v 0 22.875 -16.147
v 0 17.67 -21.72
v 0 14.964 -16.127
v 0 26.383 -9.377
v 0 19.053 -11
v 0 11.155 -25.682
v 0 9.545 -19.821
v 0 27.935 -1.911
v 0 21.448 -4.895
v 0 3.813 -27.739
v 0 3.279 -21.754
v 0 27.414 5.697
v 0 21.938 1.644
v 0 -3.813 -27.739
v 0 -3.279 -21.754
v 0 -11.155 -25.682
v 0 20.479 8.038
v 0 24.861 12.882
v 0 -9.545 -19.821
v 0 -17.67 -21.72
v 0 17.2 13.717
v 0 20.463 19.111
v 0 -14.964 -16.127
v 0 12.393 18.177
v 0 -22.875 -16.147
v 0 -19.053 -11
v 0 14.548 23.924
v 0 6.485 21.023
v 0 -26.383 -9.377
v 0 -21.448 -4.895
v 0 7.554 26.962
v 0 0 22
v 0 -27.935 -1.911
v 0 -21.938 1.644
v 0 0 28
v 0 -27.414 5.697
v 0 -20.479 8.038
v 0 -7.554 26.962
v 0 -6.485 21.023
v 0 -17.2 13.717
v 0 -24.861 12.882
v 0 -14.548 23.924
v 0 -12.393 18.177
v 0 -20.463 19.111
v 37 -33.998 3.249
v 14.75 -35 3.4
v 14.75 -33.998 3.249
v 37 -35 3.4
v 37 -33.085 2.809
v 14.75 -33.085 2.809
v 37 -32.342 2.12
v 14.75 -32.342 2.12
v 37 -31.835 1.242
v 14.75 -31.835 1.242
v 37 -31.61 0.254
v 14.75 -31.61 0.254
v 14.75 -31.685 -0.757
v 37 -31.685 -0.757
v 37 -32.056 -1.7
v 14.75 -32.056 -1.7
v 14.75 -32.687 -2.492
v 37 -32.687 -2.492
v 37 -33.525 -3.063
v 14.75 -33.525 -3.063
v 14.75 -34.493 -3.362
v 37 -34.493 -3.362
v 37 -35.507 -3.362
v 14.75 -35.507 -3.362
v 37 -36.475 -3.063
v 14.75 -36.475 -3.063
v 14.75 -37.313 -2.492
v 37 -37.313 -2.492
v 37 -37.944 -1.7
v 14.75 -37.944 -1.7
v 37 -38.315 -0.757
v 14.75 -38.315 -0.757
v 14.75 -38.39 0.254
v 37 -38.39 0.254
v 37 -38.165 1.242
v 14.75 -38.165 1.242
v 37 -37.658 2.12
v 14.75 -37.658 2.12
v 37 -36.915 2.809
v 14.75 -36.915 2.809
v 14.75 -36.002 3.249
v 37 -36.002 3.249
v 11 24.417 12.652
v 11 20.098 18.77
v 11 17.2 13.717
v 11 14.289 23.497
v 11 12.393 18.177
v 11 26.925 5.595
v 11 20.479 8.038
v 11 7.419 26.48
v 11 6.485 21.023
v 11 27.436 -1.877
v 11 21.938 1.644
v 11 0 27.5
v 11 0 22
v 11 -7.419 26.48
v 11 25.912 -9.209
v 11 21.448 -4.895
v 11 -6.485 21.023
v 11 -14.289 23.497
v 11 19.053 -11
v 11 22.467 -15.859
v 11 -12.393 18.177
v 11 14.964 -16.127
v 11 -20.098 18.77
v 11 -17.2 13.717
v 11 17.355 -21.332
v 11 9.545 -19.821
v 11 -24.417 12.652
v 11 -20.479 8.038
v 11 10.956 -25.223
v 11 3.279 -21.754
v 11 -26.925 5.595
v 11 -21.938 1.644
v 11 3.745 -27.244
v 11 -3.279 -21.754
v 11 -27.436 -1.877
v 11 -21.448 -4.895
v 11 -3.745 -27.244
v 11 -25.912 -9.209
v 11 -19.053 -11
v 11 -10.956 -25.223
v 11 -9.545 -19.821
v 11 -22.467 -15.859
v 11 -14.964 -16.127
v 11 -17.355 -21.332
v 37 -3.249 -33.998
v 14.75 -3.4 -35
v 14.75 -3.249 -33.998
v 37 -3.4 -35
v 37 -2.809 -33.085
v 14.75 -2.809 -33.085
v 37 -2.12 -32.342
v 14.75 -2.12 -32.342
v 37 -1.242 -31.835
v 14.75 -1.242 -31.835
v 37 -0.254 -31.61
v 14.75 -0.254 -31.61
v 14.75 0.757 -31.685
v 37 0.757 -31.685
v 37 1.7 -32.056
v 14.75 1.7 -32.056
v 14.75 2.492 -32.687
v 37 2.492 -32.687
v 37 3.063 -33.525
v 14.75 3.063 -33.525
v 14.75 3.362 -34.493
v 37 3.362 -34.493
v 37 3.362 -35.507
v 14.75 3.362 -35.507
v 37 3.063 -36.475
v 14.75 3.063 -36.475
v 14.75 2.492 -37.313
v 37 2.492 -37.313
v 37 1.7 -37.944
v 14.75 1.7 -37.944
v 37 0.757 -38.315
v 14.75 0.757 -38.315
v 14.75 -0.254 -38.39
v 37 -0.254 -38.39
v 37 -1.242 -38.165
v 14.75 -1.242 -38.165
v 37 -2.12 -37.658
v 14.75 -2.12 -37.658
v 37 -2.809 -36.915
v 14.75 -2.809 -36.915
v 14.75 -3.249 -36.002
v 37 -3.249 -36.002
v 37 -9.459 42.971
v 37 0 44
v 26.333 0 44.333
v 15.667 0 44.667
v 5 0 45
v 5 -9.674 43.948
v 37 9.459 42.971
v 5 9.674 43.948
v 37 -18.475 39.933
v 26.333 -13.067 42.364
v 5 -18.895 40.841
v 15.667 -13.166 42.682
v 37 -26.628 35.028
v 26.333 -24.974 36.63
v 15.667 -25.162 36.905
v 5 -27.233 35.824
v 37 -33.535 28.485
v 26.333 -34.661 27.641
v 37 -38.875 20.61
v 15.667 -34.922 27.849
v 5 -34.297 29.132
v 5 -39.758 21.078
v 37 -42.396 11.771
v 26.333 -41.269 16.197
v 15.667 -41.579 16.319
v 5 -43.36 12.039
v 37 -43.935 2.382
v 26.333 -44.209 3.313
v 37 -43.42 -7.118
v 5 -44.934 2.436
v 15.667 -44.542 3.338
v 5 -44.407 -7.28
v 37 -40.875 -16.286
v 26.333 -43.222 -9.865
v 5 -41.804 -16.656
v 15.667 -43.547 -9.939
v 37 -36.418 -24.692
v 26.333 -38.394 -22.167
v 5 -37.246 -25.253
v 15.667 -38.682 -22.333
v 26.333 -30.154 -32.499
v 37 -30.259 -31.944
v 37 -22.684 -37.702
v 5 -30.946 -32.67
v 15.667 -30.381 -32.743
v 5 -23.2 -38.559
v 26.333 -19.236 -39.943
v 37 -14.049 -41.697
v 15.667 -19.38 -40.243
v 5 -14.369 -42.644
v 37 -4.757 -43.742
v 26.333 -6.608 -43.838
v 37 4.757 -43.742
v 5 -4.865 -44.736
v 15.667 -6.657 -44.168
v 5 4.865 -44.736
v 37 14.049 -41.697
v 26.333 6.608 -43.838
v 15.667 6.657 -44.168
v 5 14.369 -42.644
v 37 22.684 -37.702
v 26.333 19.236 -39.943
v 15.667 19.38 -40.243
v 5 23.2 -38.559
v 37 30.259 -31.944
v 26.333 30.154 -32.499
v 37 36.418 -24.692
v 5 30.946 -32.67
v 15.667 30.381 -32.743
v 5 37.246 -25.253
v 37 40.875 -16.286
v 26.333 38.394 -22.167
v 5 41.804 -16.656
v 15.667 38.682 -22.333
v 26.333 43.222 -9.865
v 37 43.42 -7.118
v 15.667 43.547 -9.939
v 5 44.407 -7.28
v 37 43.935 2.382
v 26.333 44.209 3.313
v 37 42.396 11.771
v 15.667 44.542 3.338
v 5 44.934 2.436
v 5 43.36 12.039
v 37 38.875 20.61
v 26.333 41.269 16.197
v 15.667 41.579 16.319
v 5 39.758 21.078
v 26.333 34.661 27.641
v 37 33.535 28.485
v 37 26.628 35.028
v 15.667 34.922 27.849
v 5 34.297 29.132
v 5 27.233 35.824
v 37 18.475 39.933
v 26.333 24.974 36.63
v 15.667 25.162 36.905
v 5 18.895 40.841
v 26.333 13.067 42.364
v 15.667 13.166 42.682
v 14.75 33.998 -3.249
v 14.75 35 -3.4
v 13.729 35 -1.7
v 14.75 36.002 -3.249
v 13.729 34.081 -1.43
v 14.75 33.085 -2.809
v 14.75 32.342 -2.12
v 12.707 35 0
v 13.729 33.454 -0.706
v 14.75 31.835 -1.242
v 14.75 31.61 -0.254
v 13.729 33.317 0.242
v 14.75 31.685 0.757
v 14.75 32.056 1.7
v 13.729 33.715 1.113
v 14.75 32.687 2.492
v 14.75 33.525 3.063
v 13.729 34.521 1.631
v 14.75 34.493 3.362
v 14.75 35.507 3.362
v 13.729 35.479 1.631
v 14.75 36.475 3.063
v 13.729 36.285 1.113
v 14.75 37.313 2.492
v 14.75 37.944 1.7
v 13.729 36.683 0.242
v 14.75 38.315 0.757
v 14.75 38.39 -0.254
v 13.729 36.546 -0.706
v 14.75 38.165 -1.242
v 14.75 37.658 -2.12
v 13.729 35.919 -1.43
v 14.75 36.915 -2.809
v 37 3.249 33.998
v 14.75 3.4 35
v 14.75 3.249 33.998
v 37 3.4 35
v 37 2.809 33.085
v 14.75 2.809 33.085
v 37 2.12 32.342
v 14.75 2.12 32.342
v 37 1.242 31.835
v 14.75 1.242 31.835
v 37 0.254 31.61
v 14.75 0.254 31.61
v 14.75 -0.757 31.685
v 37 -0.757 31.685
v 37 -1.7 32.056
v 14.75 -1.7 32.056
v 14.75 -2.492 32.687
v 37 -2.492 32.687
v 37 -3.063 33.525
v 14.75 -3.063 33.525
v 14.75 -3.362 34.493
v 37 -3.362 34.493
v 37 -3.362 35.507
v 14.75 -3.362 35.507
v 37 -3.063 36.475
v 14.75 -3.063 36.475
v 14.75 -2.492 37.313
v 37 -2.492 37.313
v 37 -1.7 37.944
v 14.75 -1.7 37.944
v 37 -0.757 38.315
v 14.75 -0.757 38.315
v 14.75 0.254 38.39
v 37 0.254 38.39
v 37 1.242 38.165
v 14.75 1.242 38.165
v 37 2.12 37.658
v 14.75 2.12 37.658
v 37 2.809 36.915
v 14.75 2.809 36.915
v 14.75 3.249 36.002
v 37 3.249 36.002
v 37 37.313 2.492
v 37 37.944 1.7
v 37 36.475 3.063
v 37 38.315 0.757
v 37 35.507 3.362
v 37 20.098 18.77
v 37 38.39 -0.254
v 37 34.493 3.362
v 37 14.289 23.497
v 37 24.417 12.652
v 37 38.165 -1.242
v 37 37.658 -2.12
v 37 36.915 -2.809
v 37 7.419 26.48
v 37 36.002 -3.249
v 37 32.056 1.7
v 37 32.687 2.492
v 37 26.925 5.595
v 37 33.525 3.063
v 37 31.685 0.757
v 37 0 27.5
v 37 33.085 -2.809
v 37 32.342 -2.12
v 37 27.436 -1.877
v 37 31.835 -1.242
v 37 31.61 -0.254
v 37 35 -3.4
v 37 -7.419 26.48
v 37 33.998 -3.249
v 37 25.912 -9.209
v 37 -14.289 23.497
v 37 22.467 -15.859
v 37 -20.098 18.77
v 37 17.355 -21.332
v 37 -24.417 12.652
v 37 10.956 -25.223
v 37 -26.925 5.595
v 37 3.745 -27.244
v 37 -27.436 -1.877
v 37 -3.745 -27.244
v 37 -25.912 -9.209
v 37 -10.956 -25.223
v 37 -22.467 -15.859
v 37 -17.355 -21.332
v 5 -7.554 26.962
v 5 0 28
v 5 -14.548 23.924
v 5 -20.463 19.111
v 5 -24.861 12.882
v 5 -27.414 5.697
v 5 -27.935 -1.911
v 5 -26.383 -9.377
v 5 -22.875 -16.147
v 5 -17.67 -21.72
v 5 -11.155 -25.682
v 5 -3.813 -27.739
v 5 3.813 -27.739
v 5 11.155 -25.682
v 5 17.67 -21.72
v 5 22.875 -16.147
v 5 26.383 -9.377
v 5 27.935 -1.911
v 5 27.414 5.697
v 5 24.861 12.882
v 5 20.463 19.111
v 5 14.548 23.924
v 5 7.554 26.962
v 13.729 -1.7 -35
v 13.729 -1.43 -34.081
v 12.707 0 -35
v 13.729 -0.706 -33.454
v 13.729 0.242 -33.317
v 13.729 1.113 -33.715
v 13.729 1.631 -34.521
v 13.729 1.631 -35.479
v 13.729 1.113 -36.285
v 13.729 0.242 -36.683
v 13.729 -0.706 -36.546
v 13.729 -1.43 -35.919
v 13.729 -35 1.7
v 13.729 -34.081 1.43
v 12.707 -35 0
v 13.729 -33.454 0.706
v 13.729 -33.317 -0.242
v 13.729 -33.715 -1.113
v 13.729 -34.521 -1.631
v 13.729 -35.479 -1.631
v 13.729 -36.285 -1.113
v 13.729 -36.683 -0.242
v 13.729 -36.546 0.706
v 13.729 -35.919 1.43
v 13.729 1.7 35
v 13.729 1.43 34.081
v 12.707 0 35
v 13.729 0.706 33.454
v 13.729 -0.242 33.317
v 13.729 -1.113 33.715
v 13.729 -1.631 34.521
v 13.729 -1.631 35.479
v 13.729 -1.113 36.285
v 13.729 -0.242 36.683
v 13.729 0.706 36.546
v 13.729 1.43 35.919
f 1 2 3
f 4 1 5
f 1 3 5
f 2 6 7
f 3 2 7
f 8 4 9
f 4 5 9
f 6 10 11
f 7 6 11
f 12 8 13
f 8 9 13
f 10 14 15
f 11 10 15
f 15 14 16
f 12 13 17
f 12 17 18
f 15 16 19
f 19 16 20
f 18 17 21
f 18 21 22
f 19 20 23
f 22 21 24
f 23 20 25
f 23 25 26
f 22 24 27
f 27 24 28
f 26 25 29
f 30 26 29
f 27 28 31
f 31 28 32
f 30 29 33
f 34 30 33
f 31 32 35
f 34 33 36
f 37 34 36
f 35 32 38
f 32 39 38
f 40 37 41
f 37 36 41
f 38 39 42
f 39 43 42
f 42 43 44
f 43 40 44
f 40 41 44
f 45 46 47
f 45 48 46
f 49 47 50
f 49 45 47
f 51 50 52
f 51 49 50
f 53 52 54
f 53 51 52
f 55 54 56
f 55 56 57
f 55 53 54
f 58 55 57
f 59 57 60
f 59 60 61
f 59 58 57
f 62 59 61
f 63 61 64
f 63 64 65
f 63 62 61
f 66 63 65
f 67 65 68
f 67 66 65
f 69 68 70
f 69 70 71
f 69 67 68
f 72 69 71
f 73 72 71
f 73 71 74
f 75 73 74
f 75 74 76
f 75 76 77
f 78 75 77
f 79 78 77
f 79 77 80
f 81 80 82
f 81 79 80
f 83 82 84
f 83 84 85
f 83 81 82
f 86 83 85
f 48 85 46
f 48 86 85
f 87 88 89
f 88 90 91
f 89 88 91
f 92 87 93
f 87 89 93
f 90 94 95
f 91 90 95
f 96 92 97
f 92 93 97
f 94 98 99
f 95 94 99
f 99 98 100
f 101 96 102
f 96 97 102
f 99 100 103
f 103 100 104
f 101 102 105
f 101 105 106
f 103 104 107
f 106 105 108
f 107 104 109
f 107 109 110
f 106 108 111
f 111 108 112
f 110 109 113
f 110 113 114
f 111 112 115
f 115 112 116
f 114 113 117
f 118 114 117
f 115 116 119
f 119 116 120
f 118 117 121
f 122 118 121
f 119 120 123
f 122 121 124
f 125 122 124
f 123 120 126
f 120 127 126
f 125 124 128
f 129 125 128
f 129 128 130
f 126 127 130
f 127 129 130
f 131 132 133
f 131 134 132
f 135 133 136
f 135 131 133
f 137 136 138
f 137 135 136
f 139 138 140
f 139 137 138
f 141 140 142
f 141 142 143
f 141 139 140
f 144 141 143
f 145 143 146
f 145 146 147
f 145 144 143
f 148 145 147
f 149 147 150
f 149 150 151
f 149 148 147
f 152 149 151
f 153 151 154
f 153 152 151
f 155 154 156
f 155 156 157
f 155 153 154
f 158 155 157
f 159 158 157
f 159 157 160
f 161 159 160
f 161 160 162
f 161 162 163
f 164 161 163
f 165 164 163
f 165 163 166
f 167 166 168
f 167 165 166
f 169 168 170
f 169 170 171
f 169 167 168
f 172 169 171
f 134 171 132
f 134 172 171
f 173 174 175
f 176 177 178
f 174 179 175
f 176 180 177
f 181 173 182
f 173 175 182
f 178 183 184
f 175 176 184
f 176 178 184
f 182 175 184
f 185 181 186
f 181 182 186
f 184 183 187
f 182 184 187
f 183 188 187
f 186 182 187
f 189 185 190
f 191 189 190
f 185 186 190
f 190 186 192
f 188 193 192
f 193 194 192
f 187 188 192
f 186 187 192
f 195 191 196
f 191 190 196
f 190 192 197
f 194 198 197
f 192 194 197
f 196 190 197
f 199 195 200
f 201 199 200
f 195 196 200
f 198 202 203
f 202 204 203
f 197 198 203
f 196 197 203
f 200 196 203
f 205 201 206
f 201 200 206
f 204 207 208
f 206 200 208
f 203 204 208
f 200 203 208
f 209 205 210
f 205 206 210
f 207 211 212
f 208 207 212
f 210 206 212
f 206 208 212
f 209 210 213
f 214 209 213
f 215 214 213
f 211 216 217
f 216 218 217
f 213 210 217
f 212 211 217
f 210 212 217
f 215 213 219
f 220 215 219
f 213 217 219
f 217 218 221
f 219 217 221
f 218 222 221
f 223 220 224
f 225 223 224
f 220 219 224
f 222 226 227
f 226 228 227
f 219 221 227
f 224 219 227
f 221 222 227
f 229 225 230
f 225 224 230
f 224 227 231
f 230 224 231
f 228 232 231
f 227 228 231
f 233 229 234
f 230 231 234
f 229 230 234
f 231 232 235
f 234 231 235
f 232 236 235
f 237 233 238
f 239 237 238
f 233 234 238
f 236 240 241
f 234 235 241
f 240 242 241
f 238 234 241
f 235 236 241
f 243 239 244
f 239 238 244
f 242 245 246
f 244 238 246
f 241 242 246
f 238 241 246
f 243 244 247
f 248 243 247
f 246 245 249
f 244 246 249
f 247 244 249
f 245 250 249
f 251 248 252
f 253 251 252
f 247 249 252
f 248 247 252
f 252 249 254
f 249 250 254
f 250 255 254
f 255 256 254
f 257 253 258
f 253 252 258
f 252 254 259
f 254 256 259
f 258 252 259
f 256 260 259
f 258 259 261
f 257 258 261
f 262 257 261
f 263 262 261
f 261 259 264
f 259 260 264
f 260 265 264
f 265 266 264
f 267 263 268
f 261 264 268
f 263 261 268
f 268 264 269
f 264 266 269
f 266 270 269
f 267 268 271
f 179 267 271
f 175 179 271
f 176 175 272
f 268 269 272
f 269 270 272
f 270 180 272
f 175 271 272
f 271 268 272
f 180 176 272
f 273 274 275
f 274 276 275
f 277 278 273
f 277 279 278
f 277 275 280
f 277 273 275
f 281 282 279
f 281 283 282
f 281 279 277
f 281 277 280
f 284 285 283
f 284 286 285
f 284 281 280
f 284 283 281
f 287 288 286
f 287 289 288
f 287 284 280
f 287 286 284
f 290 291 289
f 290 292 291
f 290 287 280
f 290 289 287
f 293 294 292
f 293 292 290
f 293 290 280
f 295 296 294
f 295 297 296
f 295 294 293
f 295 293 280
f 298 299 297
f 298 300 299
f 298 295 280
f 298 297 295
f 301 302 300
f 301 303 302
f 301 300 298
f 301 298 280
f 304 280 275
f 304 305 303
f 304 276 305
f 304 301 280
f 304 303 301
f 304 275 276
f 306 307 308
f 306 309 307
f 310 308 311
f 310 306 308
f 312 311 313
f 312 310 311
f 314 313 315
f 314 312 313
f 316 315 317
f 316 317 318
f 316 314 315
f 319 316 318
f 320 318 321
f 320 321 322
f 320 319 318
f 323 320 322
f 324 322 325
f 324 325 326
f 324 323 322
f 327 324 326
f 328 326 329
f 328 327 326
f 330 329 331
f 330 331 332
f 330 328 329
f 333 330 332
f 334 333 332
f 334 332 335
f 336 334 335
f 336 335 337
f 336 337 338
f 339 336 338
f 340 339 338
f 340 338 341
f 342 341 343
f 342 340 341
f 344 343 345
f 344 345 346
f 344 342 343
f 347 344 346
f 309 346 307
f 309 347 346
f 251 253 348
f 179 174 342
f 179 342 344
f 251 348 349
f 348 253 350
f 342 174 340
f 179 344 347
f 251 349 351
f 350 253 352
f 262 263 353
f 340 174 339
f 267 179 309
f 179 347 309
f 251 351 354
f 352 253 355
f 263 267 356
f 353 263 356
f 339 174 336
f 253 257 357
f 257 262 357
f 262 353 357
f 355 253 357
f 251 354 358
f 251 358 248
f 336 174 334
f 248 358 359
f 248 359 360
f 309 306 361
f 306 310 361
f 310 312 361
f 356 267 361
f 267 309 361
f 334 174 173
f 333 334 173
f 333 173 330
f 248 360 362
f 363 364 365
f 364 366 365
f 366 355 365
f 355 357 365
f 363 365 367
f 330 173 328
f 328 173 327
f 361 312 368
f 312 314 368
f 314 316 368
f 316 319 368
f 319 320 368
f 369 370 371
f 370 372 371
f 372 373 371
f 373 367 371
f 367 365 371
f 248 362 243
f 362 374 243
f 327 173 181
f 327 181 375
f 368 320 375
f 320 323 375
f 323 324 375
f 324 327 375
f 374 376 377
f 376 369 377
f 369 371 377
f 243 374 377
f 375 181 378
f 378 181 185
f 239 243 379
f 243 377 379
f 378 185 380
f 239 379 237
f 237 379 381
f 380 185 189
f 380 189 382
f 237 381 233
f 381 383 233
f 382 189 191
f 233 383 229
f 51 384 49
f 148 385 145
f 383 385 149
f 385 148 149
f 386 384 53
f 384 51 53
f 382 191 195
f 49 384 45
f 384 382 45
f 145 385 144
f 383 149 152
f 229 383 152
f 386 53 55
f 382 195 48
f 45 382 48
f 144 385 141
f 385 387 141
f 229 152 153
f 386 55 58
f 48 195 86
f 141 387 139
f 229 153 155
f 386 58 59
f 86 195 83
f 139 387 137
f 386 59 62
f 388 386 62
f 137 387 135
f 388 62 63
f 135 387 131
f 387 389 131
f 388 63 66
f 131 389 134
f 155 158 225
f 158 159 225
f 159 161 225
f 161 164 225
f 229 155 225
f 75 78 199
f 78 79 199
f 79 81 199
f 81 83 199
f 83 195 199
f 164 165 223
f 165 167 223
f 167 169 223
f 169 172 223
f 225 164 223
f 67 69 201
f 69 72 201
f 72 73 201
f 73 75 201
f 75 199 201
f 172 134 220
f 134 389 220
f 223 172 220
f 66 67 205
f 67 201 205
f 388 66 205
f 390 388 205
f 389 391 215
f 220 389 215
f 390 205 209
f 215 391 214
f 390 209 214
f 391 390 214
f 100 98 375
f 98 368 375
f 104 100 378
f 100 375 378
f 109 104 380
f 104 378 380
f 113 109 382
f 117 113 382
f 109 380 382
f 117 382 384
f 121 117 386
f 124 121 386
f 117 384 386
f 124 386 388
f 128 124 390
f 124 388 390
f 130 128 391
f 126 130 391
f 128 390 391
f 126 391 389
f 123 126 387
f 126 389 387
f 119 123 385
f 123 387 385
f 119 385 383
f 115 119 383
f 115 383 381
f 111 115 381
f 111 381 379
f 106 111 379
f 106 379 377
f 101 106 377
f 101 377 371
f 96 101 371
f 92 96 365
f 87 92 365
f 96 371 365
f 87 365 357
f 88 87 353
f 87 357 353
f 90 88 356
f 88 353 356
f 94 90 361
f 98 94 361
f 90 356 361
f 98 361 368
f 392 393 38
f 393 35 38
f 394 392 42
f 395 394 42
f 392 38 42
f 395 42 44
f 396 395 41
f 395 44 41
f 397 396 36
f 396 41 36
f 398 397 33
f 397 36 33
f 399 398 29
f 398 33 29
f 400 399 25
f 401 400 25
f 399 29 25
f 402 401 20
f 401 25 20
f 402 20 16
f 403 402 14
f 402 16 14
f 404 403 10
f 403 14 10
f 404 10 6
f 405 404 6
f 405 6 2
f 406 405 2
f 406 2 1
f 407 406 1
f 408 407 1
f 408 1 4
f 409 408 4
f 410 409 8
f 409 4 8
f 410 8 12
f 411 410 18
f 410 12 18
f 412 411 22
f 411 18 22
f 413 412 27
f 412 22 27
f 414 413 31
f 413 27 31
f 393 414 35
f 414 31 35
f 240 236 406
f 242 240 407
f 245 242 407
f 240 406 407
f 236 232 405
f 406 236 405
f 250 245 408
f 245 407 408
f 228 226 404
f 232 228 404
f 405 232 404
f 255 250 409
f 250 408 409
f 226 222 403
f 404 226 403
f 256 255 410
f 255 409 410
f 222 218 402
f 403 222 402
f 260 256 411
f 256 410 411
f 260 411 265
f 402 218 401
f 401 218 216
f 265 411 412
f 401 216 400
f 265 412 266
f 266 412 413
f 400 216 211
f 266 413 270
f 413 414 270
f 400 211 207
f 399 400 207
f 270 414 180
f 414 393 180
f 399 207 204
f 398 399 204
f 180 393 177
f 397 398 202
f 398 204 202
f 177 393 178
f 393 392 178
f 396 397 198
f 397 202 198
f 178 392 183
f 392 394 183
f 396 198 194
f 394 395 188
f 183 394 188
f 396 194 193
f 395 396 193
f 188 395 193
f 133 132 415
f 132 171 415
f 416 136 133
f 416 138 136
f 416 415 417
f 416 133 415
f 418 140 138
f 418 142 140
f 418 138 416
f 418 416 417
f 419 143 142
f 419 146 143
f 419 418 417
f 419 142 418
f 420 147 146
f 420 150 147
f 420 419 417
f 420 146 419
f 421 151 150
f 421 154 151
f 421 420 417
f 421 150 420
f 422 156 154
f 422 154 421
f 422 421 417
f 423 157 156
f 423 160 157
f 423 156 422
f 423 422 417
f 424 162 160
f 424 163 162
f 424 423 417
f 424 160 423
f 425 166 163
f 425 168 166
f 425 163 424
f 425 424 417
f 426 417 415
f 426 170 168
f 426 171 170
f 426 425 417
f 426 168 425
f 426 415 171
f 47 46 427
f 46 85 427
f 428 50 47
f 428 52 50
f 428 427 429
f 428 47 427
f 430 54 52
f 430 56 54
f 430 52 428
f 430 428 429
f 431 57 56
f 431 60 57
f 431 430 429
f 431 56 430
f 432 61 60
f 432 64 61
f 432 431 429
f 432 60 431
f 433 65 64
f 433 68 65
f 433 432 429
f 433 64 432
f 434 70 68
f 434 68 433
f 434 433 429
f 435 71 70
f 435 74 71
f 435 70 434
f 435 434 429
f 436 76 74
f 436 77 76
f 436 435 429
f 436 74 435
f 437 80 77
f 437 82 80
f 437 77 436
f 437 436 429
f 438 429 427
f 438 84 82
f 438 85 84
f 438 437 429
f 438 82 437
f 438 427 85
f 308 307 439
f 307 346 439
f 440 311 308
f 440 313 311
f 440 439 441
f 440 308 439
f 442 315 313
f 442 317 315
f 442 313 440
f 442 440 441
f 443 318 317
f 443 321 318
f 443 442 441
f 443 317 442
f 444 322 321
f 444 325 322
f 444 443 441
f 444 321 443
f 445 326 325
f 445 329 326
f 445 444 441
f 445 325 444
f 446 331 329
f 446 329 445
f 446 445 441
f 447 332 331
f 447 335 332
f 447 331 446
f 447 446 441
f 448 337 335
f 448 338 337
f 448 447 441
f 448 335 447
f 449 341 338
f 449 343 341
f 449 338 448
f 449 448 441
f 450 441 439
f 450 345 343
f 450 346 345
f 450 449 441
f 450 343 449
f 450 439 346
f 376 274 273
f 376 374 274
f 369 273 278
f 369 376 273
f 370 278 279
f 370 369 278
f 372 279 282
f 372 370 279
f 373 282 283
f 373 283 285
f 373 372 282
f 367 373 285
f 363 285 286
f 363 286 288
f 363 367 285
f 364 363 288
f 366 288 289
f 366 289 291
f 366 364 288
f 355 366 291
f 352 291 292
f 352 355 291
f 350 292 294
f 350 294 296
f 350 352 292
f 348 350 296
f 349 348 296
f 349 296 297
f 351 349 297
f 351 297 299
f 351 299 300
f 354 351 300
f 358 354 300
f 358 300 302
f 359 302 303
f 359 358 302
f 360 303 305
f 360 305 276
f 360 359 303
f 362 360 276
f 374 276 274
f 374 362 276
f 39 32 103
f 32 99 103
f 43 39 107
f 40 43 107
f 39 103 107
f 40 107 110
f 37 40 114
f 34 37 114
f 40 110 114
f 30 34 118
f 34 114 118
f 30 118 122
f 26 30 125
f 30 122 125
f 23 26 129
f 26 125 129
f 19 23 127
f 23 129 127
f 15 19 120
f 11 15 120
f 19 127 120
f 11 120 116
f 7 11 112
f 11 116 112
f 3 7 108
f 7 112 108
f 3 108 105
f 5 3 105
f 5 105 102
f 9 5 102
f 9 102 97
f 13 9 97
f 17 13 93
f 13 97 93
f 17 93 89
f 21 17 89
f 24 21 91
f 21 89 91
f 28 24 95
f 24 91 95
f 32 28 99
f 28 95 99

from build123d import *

# Parameters (mm, degrees)
DAIRESEL_KAPLAMA1_COUNT = 4


with BuildPart() as part:
    # Çizim2 → Döndür1 (revolve)
    with BuildSketch(Plane.XY, mode=Mode.PRIVATE) as d_nd_r1_sk:
        Polygon((0, 22), (11, 22), (11, 27.5), (37, 27.5), (37, 44), (5, 45), (5, 28), (0, 28), align=None)
    revolve(d_nd_r1_sk.sketch.rotate(Axis((0, 0, 0), (1, 0, 0)), 90), axis=Axis((0, 0, 0), (1, 0, 0)))

    # Çizim5 → M8 Dişli Delik1 (revolve, cut)
    with BuildSketch(Plane(origin=(37, 35, 0), x_dir=(0, 0, -1), z_dir=(0, 1, 0))):
        Polygon((0, 0), (0, 24.292926105), (3.4, 22.25), (3.4, 0), align=None)
    m8_di_li_delik1 = revolve(axis=Axis((43.35, 35, 0), (-1, 0, 0)), mode=Mode.SUBTRACT)

    # Dairesel Kaplama1: M8 Dişli Delik1 ×4 about axis
    dairesel_kaplama1_axis = Axis((0, 0, 0), (1, 0, 0))
    for i in range(1, DAIRESEL_KAPLAMA1_COUNT):
        add(m8_di_li_delik1.rotate(dairesel_kaplama1_axis, i * 360 / DAIRESEL_KAPLAMA1_COUNT), mode=Mode.SUBTRACT)


solid = part.part
